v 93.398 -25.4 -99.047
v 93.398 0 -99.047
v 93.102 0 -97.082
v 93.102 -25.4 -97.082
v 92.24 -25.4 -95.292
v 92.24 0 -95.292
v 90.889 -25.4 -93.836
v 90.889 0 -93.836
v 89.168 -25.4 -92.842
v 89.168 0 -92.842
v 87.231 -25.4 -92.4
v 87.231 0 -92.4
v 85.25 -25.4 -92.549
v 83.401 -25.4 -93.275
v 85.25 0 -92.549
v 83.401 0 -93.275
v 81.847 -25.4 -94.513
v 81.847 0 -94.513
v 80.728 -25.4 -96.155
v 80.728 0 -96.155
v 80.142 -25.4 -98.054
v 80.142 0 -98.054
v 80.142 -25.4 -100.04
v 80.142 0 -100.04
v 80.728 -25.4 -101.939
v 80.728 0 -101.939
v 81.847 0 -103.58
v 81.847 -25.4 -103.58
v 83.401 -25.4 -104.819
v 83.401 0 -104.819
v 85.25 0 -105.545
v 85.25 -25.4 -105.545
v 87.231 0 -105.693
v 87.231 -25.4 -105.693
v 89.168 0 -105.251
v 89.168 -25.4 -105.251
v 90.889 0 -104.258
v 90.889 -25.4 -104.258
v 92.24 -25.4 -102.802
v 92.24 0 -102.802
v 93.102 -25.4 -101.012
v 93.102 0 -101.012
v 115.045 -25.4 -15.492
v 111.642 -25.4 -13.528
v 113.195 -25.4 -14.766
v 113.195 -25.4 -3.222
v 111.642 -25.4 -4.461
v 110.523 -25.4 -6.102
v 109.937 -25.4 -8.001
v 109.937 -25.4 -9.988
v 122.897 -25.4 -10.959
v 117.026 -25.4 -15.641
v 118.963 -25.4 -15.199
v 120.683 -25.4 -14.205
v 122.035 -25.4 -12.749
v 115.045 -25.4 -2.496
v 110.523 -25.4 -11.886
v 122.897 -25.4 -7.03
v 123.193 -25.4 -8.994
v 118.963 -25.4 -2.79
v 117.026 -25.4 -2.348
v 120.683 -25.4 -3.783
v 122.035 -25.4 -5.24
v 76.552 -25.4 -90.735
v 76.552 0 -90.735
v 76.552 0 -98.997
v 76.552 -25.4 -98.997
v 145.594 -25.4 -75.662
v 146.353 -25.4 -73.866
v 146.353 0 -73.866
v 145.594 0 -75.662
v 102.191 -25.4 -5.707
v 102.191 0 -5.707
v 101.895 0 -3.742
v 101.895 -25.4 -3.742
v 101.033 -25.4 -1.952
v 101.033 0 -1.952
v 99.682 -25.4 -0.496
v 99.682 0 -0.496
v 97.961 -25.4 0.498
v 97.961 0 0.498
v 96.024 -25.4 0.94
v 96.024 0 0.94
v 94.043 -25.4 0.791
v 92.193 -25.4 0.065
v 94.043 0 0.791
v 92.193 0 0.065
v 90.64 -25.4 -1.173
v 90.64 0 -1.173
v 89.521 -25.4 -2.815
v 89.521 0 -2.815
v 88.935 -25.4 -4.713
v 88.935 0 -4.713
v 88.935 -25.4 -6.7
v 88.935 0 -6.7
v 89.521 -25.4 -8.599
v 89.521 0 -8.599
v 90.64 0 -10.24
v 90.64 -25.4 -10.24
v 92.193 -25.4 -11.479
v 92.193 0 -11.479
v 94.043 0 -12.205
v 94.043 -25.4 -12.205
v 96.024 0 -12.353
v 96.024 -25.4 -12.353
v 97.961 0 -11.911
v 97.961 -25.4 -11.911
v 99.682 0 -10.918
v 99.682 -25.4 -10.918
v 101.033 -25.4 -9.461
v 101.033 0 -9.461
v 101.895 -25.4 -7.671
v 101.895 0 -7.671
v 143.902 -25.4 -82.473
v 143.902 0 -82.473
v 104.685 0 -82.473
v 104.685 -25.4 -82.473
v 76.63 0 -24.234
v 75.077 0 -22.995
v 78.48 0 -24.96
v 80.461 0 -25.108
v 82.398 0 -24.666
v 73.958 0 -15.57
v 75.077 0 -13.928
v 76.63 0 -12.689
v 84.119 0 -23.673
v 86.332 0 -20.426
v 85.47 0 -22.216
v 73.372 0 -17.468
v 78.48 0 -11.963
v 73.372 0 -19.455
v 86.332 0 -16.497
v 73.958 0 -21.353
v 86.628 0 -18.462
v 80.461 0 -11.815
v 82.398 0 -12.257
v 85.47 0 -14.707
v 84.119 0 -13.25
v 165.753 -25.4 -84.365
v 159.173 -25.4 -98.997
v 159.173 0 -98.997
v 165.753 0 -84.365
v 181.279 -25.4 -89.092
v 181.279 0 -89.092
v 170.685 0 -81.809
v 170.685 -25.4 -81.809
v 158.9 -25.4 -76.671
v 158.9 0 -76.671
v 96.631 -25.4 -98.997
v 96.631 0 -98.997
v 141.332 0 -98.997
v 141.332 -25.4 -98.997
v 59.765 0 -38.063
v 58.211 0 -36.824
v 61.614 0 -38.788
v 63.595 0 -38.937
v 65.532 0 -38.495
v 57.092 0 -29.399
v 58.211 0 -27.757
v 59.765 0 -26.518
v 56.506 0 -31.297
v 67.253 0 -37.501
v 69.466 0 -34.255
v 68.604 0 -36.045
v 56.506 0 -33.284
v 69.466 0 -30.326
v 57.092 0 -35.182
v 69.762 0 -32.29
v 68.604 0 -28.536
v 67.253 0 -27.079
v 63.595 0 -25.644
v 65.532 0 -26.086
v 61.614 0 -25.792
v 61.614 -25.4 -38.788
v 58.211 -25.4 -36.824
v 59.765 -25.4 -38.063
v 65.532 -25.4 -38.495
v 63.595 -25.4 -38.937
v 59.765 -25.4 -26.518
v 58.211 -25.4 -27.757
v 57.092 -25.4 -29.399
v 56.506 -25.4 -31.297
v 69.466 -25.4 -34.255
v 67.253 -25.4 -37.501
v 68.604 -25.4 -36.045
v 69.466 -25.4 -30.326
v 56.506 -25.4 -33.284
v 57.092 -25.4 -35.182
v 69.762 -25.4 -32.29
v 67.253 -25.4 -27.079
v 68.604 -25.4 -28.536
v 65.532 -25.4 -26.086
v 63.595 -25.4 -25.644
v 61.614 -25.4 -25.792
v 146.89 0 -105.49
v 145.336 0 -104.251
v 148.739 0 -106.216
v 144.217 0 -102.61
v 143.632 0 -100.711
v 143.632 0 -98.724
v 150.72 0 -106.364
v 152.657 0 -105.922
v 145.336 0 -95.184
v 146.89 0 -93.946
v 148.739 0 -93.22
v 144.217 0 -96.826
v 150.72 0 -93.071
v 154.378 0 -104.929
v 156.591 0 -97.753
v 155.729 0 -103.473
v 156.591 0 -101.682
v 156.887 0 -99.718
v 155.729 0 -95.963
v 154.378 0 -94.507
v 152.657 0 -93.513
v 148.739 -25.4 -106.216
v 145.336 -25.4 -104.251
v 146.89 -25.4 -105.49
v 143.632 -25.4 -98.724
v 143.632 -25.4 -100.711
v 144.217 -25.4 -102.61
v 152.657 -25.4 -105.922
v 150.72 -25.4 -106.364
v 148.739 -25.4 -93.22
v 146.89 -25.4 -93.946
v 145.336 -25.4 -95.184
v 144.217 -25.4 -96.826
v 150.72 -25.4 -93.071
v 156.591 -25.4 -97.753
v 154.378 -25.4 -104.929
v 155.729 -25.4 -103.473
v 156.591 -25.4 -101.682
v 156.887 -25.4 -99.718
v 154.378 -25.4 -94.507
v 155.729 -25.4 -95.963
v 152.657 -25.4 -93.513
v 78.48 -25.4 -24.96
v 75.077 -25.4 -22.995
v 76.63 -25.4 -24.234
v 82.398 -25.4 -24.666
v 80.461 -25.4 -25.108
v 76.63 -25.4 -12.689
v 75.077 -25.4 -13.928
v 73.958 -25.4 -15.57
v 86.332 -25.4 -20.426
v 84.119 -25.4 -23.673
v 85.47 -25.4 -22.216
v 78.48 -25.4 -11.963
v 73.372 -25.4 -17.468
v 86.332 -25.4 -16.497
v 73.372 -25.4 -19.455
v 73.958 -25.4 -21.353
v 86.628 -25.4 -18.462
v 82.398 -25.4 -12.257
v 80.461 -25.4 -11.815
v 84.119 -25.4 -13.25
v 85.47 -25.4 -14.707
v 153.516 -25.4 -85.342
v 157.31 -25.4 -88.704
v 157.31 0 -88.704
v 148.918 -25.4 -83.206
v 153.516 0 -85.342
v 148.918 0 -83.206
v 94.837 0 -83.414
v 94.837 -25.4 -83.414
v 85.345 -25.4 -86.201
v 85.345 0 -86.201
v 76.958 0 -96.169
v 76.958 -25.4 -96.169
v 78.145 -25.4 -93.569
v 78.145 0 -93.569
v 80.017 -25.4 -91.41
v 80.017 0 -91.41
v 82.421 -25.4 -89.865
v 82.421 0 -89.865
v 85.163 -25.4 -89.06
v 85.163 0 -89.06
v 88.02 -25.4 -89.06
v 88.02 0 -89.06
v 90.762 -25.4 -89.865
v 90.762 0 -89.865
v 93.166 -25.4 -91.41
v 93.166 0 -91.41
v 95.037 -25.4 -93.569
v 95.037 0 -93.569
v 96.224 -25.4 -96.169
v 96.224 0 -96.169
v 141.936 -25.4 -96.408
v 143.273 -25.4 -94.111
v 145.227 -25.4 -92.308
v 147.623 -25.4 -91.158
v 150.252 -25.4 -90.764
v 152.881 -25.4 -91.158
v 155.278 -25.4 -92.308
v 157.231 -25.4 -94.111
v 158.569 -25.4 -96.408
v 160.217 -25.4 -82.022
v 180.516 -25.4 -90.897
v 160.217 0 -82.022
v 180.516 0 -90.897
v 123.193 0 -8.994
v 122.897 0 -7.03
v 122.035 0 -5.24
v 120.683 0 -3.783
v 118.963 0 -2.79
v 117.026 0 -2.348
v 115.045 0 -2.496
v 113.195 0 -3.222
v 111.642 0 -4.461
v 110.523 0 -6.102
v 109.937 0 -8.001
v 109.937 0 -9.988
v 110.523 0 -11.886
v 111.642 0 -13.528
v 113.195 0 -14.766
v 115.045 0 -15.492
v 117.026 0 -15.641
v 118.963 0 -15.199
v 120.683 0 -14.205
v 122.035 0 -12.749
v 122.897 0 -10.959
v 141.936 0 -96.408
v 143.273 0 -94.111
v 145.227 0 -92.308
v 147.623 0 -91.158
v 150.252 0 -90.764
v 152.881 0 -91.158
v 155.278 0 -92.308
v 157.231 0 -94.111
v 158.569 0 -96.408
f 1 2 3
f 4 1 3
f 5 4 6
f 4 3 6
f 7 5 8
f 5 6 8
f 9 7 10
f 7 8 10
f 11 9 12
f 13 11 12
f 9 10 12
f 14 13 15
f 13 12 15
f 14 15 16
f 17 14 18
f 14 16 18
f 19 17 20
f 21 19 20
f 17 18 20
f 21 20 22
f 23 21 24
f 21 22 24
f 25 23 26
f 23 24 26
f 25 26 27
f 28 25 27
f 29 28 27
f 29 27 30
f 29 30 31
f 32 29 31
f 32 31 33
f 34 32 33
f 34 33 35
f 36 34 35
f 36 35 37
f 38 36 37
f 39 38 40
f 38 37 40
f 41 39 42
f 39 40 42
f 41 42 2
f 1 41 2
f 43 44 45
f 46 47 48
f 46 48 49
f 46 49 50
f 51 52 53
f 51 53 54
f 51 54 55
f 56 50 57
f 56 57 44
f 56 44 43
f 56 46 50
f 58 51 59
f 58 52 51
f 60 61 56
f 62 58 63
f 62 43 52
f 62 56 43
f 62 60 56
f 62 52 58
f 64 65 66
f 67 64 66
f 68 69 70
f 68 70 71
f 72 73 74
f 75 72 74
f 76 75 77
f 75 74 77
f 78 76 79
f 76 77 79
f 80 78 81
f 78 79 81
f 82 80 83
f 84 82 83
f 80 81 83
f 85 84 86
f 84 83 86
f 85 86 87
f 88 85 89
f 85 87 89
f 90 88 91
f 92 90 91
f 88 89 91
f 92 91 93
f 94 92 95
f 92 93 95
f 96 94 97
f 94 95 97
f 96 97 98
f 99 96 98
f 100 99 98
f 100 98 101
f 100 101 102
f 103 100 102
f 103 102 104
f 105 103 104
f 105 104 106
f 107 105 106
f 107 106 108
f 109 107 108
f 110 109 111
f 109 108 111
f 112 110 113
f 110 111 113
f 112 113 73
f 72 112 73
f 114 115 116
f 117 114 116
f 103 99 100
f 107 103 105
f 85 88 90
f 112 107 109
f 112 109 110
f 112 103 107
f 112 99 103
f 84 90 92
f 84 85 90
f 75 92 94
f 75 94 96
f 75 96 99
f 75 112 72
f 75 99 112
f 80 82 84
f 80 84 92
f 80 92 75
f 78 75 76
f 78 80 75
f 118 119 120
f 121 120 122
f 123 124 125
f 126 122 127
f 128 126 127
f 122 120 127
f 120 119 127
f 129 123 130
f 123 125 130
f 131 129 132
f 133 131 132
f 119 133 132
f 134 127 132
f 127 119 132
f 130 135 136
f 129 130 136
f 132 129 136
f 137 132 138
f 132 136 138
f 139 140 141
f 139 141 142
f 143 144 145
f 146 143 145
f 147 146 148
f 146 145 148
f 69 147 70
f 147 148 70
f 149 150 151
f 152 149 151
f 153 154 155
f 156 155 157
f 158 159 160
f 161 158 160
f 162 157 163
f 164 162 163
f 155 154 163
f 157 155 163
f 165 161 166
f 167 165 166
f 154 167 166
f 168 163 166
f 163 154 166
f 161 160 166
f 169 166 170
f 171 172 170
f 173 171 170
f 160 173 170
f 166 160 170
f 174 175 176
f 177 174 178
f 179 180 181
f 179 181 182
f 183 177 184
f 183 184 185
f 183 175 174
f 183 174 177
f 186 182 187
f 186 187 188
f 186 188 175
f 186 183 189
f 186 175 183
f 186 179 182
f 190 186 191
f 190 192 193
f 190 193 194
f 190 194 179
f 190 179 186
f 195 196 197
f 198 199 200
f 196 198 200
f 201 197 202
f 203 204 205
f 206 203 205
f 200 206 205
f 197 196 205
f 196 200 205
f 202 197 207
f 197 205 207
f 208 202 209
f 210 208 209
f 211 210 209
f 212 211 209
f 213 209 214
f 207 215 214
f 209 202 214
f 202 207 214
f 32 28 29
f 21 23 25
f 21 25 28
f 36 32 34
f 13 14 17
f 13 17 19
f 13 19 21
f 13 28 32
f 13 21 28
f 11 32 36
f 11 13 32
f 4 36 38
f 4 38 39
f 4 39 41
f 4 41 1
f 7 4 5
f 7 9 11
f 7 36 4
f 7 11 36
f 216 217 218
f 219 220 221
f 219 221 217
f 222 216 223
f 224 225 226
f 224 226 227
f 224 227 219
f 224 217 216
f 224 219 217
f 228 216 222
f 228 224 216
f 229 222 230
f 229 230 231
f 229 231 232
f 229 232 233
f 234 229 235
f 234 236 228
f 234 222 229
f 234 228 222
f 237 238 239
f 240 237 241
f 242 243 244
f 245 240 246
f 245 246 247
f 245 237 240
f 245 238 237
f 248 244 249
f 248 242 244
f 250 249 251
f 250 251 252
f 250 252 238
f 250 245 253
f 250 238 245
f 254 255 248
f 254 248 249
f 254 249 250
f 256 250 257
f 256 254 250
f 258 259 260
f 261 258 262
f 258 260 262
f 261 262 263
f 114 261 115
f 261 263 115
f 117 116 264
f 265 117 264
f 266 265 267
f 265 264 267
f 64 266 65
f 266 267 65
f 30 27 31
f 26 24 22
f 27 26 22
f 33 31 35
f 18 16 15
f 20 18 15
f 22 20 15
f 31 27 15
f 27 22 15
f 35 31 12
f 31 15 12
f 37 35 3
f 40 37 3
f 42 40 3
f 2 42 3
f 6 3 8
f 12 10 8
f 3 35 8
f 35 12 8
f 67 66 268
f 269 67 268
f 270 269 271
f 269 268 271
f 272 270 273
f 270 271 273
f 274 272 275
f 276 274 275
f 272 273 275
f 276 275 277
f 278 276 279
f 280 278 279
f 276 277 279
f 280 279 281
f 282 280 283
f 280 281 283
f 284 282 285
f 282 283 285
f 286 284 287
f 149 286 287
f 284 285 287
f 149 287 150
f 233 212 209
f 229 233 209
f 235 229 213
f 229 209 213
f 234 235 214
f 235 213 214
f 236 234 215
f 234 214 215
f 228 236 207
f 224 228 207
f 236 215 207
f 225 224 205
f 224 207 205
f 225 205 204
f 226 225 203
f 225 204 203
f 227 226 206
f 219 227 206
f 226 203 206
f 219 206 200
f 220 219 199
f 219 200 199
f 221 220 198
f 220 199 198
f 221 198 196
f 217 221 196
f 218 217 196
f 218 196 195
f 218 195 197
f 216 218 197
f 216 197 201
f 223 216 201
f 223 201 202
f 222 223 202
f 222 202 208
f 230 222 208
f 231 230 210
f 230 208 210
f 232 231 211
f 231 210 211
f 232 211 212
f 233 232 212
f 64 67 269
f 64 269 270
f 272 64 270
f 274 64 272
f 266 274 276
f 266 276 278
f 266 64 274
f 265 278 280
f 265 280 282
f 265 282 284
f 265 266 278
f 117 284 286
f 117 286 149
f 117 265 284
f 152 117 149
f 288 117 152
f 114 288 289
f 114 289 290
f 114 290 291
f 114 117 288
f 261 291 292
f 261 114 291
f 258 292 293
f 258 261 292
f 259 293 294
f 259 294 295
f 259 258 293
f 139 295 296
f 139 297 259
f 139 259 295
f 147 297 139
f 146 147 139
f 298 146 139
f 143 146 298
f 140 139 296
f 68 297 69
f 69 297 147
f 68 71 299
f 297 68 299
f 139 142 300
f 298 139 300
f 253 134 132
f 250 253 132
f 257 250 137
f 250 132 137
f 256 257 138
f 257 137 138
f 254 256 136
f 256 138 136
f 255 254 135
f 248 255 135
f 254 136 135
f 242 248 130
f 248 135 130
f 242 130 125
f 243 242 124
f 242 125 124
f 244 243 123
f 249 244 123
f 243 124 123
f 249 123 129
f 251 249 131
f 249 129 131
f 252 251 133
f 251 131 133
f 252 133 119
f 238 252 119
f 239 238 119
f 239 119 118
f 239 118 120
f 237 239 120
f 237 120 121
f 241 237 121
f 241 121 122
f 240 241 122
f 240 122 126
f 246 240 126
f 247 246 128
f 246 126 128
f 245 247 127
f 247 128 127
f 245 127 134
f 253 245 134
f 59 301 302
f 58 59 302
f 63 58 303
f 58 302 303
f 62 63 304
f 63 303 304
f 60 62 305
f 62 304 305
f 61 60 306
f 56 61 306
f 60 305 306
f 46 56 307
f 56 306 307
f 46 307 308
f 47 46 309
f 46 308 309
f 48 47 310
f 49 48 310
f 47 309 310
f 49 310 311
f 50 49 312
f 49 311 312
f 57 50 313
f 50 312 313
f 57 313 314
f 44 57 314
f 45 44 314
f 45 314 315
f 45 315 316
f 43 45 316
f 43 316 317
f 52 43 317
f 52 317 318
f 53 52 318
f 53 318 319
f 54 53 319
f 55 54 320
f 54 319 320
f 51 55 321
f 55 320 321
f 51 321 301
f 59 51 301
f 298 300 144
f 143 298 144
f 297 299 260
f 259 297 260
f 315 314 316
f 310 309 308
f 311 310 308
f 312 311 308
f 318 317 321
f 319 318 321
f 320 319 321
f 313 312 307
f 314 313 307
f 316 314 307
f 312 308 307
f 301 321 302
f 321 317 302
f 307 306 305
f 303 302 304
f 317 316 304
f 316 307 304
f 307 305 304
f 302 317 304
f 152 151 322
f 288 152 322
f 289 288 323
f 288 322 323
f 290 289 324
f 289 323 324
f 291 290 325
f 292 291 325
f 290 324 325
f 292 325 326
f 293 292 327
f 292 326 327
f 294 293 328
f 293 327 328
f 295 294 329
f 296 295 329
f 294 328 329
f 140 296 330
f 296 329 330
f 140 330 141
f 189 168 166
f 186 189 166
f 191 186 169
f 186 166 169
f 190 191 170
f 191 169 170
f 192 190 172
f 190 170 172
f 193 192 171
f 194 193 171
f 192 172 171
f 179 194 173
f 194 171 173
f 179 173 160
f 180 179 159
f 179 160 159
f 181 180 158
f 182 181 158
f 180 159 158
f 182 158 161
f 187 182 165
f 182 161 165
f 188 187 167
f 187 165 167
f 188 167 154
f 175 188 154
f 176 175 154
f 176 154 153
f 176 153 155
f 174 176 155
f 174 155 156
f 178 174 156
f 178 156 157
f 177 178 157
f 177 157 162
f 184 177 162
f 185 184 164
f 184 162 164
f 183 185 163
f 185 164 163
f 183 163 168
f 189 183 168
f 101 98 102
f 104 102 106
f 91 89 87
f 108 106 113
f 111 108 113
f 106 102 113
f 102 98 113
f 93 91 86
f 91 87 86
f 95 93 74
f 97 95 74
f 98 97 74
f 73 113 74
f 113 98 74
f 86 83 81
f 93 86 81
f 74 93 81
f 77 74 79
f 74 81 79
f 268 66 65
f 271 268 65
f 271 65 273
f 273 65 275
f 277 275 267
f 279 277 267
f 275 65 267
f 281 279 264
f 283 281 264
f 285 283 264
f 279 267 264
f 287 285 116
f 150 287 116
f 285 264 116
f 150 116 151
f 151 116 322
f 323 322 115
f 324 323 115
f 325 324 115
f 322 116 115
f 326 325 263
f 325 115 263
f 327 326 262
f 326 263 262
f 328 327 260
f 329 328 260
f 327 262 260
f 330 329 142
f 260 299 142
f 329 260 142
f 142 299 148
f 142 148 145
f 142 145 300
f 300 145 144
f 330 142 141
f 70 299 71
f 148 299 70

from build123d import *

# Parameters (mm, degrees)
F0_R     = 6.6651774255
F1_DEPTH = 25.4
F2_DEPTH = 25.4


# Not quite as in the source:
# - a feature names something its author has since deleted; it is built from what else it names


with BuildPart() as f1:
    # F0 (on Front) → F1 (new body)
    with BuildSketch(Plane.XZ):
        with Locations((63.0971782387, -32.2904203791)):
            Circle(F0_R)
    extrude(amount=F1_DEPTH)

    # F0 (on Front) → F2 (join)
    with BuildSketch(Plane.XZ):
        with Locations((63.0971782387, -32.2904203791)):
            Circle(F0_R)
    extrude(amount=F2_DEPTH)


with BuildPart() as f2:
    # F0 (on Front) → F2, piece 2 (new body)
    with BuildSketch(Plane.XZ):
        with Locations((79.9629938861, -18.4615177807)):
            Circle(F0_R)
    extrude(amount=F2_DEPTH)


with BuildPart() as f2b:
    # F0 (on Front) → F2, piece 3 (new body)
    with BuildSketch(Plane.XZ):
        with Locations((95.5259158782, -5.706744201)):
            Circle(F0_R)
    extrude(amount=F2_DEPTH)


with BuildPart() as f2c:
    # F0 (on Front) → F2, piece 4 (new body)
    with BuildSketch(Plane.XZ):
        with Locations((116.5277564155, -8.9942043108)):
            Circle(F0_R)
    extrude(amount=F2_DEPTH)


with BuildPart() as f2d:
    # F0 (on Front) → F2, piece 5 (new body)
    with BuildSketch(Plane.XZ):
        with BuildLine():
            ThreePointArc((157.310231805, -88.7043293319), (151.2945416105, -84.1069008982), (143.901631238, -82.4729630341))
            Line((143.901631238, -82.4729630341), (104.6853437268, -82.4729630341))
            ThreePointArc((104.6853437268, -82.4729630341), (90.0244825693, -84.5811974693), (76.5517114458, -90.7350532171))
            Line((76.5517114458, -90.7350532171), (76.5517114458, -98.9971434001))
            ThreePointArc((76.5517114458, -98.9971434001), (86.591364621, -88.957490225), (96.6310177961, -98.9971434001))
            Line((96.6310177961, -98.9971434001), (141.3318150355, -98.9971434001))
            ThreePointArc((141.3318150355, -98.9971434001), (150.2522141557, -90.7635242584), (159.1726132759, -98.9971434001))
            Line((159.1726132759, -98.9971434001), (165.7533920403, -84.3646685002))
            Line((165.7533920403, -84.3646685002), (160.2166072323, -82.0221779593))
            Line((160.2166072323, -82.0221779593), (157.310231805, -88.7043293319))
        make_face()
        with BuildLine():
            Line((145.5935956957, -75.6619566722), (160.2166072323, -82.0221779593))
            Line((160.2166072323, -82.0221779593), (165.7533920403, -84.3646685002))
            Line((165.7533920403, -84.3646685002), (180.5155317609, -90.8968567243))
            Line((180.5155317609, -90.8968567243), (181.2792439876, -89.0917223253))
            ThreePointArc((181.2792439876, -89.0917223253), (164.9152343167, -78.9580413658), (146.3532217869, -73.8664803927))
            Line((146.3532217869, -73.8664803927), (145.5935956957, -75.6619566722))
        make_face()
    extrude(amount=F2_DEPTH)


with BuildPart() as f2e:
    # F0 (on Front) → F2, piece 6 (new body)
    with BuildSketch(Plane.XZ):
        with Locations((86.7331768035, -99.0469055689)):
            Circle(F0_R)
    extrude(amount=F2_DEPTH)


with BuildPart() as f2f:
    # F0 (on Front) → F2, piece 7 (new body)
    with BuildSketch(Plane.XZ):
        with Locations((150.2222788557, -99.7178808889)):
            Circle(F0_R)
    extrude(amount=F2_DEPTH)


solid = Compound([f1.part, f2.part, f2b.part, f2c.part, f2d.part, f2e.part, f2f.part])
